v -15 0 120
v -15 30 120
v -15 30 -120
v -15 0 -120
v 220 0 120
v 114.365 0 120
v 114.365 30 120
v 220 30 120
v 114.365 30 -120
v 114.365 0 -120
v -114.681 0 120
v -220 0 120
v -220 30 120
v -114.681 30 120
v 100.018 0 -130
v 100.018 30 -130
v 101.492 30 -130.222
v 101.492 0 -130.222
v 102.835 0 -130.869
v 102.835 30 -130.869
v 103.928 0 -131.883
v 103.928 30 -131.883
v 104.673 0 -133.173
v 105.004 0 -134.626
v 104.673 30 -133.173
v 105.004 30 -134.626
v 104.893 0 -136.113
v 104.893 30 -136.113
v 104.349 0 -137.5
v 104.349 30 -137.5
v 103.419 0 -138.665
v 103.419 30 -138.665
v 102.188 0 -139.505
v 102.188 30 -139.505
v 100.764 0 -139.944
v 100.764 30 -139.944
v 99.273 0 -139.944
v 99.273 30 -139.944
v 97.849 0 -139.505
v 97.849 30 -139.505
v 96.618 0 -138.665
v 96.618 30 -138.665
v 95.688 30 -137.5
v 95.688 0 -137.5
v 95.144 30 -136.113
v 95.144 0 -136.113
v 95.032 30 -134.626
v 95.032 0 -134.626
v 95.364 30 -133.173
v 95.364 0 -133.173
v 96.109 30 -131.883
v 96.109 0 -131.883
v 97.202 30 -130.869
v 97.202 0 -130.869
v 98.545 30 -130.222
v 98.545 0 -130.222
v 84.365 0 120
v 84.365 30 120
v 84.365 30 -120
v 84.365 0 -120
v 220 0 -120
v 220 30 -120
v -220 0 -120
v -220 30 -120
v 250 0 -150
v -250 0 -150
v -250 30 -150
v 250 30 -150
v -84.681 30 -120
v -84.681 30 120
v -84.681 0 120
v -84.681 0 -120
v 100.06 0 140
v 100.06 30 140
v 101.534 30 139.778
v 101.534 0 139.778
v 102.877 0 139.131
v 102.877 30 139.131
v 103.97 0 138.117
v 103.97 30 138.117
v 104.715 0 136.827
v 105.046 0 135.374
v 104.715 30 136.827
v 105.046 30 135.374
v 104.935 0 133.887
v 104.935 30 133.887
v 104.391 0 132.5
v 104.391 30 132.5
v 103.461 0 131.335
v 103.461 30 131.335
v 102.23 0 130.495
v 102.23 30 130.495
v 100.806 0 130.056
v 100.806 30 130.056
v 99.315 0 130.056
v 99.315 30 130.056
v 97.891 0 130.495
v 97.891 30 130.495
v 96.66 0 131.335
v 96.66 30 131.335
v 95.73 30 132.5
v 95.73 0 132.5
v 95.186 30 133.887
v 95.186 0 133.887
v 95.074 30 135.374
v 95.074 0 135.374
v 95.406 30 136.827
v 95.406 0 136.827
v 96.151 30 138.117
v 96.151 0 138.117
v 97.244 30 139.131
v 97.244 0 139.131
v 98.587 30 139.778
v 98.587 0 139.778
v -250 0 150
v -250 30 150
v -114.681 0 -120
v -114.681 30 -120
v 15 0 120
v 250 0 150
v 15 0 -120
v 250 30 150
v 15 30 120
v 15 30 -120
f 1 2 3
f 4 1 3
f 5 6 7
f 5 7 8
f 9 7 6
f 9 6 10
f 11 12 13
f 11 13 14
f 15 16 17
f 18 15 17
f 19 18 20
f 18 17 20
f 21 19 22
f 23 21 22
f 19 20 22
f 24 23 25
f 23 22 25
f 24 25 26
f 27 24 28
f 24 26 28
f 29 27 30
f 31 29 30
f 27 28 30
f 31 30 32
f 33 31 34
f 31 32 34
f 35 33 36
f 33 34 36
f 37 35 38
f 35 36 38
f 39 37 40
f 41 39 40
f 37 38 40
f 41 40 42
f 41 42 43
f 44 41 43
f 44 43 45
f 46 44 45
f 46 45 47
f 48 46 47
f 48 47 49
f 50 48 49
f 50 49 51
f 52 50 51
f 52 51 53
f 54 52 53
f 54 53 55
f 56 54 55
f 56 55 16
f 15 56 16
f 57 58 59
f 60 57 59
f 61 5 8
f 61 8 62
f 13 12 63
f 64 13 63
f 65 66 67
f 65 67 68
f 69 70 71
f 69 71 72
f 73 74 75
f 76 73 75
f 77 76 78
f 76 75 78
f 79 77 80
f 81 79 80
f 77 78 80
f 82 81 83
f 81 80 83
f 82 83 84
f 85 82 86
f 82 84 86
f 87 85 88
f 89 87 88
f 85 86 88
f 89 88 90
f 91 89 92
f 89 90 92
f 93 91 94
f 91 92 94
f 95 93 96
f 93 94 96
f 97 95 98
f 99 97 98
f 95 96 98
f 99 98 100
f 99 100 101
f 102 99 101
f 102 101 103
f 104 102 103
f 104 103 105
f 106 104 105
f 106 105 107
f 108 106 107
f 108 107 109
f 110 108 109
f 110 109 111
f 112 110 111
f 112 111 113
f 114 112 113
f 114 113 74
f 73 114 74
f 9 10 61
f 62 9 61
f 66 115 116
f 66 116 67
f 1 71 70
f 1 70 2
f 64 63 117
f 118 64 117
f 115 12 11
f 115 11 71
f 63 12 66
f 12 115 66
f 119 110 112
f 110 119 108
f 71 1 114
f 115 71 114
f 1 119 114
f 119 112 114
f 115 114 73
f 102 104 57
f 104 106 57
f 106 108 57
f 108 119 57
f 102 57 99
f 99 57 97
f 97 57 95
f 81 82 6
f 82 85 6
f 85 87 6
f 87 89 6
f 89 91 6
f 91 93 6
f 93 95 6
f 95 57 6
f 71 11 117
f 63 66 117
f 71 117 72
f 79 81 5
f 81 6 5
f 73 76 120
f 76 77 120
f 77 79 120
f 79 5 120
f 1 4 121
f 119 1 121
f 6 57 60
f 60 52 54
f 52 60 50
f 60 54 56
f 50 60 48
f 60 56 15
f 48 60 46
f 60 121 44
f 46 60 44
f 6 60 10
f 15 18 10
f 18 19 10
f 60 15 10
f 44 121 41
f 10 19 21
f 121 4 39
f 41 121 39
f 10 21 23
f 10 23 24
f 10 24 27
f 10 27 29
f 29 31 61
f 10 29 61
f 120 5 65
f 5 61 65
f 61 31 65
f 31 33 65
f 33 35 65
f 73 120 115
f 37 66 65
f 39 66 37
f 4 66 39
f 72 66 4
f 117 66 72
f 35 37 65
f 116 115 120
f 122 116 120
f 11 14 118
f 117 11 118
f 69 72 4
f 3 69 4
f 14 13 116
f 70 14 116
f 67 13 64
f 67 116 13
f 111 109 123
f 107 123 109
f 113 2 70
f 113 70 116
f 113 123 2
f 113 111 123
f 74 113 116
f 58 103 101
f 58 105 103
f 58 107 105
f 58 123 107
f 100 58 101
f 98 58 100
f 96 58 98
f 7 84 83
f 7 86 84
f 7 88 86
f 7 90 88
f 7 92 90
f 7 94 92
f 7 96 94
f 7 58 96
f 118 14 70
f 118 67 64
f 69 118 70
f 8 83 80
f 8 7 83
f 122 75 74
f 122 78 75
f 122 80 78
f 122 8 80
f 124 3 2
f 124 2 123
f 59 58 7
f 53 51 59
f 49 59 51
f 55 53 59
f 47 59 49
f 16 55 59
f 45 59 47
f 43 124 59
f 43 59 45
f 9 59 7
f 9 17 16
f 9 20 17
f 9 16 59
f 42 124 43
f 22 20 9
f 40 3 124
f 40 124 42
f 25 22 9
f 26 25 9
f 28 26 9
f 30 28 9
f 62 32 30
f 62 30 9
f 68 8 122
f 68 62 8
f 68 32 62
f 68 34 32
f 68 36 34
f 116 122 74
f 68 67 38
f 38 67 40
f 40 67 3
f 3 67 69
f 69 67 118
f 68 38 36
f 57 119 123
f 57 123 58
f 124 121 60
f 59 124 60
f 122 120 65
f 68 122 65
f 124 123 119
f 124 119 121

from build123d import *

# Parameters (mm, degrees)
SKETCH2_W           = 500
SKETCH2_H           = 300
SKETCH2_W_2         = 440
SKETCH2_H_2         = 240
BOSS_EXTRUDE1_DEPTH = 30
SKETCH3_W           = 30
SKETCH3_H           = 240
BOSS_EXTRUDE2_DEPTH = 30
SKETCH4_W           = 30
SKETCH4_H           = 240
BOSS_EXTRUDE3_DEPTH = 30
SKETCH8_R           = 5
CUT_EXTRUDE1_DEPTH  = 32
SKETCH9_R           = 5
CUT_EXTRUDE2_DEPTH  = 34


with BuildPart() as part:
    # Sketch2 → Boss-Extrude1 (new body)
    with BuildSketch(Plane(origin=(0, 0, 0), x_dir=(1, 0, 0), z_dir=(0, 1, 0))):
        Rectangle(SKETCH2_W, SKETCH2_H)
        Rectangle(SKETCH2_W_2, SKETCH2_H_2, mode=Mode.SUBTRACT)
    extrude(amount=BOSS_EXTRUDE1_DEPTH)

    # Sketch3 → Boss-Extrude2 (add)
    with BuildSketch(Plane(origin=(0, 30, 0), x_dir=(1, 0, 0), z_dir=(0, 1, 0))):
        Rectangle(SKETCH3_W, SKETCH3_H)
    extrude(amount=-BOSS_EXTRUDE2_DEPTH)

    # Sketch4 → Boss-Extrude3 (add)
    with BuildSketch(Plane(origin=(0, 30, 0), x_dir=(1, 0, 0), z_dir=(0, 1, 0))):
        with Locations((-99.680978572, 0)):
            Rectangle(SKETCH4_W, SKETCH4_H)
        with Locations((99.36531106, 0)):
            Rectangle(SKETCH4_W, SKETCH4_H)
    extrude(amount=-BOSS_EXTRUDE3_DEPTH)

    # Sketch8 → Cut-Extrude1 (cut)
    with BuildSketch(Plane(origin=(0, 30, 0), x_dir=(1, 0, 0), z_dir=(0, 1, 0))):
        with Locations(Location((100.018449151, 135, 0), (0, 0, 270))):
            Circle(SKETCH8_R)
    extrude(amount=-CUT_EXTRUDE1_DEPTH, mode=Mode.SUBTRACT)

    # Sketch9 → Cut-Extrude2 (cut)
    with BuildSketch(Plane(origin=(0, 30, 0), x_dir=(1, 0, 0), z_dir=(0, 1, 0))):
        with Locations(Location((100.060395289, -135, 0), (0, 0, 270))):
            Circle(SKETCH9_R)
    extrude(amount=-CUT_EXTRUDE2_DEPTH, mode=Mode.SUBTRACT)


solid = part.part
